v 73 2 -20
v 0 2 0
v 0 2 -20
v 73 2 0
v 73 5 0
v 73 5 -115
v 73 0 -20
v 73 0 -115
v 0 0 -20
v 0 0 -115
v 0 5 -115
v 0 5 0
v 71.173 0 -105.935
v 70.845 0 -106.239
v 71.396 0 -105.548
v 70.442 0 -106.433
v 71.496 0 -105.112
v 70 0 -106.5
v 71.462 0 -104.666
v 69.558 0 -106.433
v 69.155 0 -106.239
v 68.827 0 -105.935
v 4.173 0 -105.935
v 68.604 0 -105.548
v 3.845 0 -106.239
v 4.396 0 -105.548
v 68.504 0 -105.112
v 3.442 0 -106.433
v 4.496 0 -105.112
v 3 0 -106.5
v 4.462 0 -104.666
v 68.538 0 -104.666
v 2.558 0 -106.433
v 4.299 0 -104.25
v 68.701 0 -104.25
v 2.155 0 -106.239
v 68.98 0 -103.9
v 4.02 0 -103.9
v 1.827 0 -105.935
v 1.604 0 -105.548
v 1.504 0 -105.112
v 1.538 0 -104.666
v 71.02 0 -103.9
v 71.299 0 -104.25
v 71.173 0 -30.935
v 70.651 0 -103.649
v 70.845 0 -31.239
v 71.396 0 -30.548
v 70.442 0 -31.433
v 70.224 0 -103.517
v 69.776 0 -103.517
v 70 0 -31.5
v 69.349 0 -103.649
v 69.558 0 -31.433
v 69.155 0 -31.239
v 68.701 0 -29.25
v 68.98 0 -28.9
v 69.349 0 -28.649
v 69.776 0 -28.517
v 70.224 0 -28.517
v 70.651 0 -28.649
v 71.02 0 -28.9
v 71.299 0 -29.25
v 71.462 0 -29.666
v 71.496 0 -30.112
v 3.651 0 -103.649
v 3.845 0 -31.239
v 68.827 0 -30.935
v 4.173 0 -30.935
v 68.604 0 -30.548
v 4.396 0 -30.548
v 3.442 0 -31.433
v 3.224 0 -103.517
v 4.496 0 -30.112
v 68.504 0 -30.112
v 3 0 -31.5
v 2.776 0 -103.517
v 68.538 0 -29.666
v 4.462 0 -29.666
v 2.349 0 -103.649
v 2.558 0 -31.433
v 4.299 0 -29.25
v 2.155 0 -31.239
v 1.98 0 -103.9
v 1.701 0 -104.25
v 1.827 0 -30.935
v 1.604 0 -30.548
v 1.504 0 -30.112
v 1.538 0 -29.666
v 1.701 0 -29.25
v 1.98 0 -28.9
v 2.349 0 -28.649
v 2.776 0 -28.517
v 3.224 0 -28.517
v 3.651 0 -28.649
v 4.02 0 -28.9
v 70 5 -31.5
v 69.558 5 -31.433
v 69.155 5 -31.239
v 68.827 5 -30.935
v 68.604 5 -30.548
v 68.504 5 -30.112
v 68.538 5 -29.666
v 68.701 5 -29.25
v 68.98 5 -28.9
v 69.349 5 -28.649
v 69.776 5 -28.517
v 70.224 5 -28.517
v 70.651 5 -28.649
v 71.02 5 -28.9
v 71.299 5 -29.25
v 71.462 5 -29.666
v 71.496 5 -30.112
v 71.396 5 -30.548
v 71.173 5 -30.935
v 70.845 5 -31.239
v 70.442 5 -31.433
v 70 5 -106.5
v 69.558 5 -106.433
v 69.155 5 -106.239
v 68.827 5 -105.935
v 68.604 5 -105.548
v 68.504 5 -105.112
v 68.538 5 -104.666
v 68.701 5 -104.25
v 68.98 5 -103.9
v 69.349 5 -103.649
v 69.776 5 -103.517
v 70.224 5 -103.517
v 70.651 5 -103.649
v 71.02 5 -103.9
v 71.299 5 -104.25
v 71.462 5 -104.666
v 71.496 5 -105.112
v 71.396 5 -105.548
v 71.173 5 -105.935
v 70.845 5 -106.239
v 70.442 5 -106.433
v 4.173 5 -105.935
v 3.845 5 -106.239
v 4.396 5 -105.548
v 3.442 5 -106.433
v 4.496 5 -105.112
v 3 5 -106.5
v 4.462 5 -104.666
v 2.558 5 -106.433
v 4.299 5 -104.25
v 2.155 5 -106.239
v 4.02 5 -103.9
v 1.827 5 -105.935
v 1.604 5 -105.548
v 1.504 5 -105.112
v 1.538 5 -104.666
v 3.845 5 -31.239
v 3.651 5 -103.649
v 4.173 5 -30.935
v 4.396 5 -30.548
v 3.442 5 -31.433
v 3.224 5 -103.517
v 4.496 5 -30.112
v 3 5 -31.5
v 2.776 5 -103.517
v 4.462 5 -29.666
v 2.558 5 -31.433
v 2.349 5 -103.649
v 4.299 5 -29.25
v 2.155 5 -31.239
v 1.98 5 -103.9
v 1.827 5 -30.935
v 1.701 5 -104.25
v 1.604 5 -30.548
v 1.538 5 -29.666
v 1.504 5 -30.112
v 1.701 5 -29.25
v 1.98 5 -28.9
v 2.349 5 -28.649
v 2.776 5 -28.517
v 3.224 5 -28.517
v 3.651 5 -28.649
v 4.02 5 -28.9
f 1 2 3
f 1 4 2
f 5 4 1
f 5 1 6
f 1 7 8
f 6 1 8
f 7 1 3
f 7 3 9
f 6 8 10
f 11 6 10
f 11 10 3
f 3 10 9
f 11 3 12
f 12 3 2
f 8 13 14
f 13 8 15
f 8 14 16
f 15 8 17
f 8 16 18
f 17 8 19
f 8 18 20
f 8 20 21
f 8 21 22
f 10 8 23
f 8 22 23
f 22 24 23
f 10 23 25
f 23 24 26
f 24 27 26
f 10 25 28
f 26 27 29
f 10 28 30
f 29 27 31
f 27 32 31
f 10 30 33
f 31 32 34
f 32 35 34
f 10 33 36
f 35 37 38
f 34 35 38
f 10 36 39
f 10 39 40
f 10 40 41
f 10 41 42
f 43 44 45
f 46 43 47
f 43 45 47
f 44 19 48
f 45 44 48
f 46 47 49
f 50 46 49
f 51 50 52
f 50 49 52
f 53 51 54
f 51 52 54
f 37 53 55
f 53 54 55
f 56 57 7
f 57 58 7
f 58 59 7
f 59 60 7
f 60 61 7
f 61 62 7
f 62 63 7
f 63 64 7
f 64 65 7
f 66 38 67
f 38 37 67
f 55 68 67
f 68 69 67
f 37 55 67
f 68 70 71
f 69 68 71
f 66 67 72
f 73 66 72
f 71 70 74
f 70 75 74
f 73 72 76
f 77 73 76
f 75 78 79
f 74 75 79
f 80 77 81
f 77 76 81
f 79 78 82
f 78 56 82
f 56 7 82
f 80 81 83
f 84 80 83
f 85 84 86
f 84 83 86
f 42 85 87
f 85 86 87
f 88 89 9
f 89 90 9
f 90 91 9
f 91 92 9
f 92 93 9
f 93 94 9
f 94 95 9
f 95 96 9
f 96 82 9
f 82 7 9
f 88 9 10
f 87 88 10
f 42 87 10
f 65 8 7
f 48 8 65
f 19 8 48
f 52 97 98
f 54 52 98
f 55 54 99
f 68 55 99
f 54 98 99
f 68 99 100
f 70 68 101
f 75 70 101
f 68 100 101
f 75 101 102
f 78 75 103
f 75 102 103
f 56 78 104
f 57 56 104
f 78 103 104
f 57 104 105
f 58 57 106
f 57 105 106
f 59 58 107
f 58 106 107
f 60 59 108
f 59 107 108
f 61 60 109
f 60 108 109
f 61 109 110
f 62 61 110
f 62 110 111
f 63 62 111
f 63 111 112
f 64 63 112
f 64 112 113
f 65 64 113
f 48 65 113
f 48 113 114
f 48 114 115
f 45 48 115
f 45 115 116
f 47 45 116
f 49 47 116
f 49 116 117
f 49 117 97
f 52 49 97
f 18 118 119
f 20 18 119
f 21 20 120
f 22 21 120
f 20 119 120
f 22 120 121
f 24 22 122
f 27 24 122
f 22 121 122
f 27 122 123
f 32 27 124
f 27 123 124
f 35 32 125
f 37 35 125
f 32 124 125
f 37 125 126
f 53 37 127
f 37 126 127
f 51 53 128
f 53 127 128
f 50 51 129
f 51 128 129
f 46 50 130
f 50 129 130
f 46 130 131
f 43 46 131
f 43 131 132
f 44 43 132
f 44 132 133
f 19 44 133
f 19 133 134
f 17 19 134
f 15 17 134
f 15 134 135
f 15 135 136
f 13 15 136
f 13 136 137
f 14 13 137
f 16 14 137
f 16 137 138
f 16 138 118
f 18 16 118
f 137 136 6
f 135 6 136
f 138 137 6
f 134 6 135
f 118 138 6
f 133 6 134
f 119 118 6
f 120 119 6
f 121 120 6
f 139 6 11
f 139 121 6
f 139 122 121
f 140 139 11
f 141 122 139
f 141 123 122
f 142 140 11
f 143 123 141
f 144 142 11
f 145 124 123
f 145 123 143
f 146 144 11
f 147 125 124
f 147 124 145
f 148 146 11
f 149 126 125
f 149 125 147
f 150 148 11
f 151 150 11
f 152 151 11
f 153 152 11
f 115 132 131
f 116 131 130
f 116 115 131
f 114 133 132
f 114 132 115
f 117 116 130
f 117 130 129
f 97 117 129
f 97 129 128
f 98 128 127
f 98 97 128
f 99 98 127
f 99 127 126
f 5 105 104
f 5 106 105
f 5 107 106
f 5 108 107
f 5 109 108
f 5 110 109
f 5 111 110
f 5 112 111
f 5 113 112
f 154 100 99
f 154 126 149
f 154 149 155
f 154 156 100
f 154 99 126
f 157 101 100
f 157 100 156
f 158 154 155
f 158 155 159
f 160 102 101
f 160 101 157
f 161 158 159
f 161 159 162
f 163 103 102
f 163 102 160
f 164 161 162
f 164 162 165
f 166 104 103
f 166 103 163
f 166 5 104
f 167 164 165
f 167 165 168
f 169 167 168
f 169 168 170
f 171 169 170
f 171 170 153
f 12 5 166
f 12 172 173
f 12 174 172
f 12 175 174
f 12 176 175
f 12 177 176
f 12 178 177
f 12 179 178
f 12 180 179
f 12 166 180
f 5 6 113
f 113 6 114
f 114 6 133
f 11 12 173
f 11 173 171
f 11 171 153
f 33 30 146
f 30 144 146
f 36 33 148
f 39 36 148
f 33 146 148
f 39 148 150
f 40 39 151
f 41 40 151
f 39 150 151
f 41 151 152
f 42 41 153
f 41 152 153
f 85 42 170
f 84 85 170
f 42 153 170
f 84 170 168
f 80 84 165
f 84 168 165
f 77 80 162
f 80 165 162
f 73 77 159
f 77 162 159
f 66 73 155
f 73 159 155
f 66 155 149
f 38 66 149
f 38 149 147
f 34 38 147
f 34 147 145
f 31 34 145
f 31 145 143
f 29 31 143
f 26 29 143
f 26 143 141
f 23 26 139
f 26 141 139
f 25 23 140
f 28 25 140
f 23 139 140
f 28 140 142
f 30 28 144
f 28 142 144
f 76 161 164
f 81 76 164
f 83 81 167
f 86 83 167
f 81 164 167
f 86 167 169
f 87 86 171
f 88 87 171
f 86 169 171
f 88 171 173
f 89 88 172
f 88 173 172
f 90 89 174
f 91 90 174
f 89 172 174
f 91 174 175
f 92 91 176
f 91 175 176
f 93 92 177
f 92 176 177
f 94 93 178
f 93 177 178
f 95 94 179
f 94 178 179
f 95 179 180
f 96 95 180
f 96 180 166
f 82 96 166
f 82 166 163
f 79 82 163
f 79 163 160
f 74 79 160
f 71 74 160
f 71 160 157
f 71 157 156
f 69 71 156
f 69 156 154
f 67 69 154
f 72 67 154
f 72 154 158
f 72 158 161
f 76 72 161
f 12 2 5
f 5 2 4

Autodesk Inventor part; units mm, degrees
ref_plane "YZ Plane" through (0, 0, 0) normal (1, 0, 0) x (0, 1, 0)
ref_plane "XZ Plane" through (0, 0, 0) normal (0, 1, 0) x (-1, 0, 0)
ref_plane "XY Plane" through (0, 0, 0) normal (0, 0, 1) x (1, 0, 0)
sketch "Sketch1" plane through (0, 0, 0) normal (0, 1, 0) x (-1, 0, 0)
  line L0 (0, 0) -> (-73, 0)
  line L1 (-73, 0) -> (-73, -115)
  line L2 (-73, -115) -> (0, -115)
  line L3 (0, -115) -> (0, 0)
  dimension "d0" = 115
  dimension "d1" = 73
extrude "Extrusion1" add sketch "Sketch1" along normal blind 5
sketch "Sketch2" plane through (73, 0, 0) normal (1, 0, 0) x (0, 0, -1)
  line L0 (0, 0) -> (0, 5) construction
  line L1 (0, 0) -> (115, 0) construction
  line L2 (0, 2) -> (20, 2)
  line L3 (20, 2) -> (20, 0)
  line L4 (0, 2) -> (0, 0)
  line L5 (20, 0) -> (0, 0)
  dimension "d4" = 20
  dimension "d5" = 2
extrude "Extrusion2" cut sketch "Sketch2" against normal through all
sketch "Sketch3" plane through (0, 0, 0) normal (0, -1, 0) x (1, 0, 0)
  line L0 (0, -115) -> (0, 0) construction
  line L1 (73, -115) -> (0, -115) construction
  line L2 (0, 0) -> (73, 0) construction
  line L3 (73, 0) -> (73, -115) construction
  line L4 (73, -20) -> (0, -20) construction
  line L5 (36.5, -115) -> (36.5, -20) construction
  line L6 (73, -20) -> (0, -20) construction
  point P0 (3, -105)
  point P1 (3, -30)
  point P2 (70, -105)
  point P3 (70, -30)
  dimension "d8" = 10
  dimension "d9" = 3
  dimension "d10" = 3
  dimension "d11" = 10
hole "Hole1" at (3, 0, -105) at (3, 0, -30) at (70, 0, -105) at (70, 0, -30) direction (0, 1, 0) diameter 3 end through all
equation "\"d10\" = d9"
equation "\"d11\" = d8"
properties part number "arduinoShelf" material "Plywood, Sheathing"
